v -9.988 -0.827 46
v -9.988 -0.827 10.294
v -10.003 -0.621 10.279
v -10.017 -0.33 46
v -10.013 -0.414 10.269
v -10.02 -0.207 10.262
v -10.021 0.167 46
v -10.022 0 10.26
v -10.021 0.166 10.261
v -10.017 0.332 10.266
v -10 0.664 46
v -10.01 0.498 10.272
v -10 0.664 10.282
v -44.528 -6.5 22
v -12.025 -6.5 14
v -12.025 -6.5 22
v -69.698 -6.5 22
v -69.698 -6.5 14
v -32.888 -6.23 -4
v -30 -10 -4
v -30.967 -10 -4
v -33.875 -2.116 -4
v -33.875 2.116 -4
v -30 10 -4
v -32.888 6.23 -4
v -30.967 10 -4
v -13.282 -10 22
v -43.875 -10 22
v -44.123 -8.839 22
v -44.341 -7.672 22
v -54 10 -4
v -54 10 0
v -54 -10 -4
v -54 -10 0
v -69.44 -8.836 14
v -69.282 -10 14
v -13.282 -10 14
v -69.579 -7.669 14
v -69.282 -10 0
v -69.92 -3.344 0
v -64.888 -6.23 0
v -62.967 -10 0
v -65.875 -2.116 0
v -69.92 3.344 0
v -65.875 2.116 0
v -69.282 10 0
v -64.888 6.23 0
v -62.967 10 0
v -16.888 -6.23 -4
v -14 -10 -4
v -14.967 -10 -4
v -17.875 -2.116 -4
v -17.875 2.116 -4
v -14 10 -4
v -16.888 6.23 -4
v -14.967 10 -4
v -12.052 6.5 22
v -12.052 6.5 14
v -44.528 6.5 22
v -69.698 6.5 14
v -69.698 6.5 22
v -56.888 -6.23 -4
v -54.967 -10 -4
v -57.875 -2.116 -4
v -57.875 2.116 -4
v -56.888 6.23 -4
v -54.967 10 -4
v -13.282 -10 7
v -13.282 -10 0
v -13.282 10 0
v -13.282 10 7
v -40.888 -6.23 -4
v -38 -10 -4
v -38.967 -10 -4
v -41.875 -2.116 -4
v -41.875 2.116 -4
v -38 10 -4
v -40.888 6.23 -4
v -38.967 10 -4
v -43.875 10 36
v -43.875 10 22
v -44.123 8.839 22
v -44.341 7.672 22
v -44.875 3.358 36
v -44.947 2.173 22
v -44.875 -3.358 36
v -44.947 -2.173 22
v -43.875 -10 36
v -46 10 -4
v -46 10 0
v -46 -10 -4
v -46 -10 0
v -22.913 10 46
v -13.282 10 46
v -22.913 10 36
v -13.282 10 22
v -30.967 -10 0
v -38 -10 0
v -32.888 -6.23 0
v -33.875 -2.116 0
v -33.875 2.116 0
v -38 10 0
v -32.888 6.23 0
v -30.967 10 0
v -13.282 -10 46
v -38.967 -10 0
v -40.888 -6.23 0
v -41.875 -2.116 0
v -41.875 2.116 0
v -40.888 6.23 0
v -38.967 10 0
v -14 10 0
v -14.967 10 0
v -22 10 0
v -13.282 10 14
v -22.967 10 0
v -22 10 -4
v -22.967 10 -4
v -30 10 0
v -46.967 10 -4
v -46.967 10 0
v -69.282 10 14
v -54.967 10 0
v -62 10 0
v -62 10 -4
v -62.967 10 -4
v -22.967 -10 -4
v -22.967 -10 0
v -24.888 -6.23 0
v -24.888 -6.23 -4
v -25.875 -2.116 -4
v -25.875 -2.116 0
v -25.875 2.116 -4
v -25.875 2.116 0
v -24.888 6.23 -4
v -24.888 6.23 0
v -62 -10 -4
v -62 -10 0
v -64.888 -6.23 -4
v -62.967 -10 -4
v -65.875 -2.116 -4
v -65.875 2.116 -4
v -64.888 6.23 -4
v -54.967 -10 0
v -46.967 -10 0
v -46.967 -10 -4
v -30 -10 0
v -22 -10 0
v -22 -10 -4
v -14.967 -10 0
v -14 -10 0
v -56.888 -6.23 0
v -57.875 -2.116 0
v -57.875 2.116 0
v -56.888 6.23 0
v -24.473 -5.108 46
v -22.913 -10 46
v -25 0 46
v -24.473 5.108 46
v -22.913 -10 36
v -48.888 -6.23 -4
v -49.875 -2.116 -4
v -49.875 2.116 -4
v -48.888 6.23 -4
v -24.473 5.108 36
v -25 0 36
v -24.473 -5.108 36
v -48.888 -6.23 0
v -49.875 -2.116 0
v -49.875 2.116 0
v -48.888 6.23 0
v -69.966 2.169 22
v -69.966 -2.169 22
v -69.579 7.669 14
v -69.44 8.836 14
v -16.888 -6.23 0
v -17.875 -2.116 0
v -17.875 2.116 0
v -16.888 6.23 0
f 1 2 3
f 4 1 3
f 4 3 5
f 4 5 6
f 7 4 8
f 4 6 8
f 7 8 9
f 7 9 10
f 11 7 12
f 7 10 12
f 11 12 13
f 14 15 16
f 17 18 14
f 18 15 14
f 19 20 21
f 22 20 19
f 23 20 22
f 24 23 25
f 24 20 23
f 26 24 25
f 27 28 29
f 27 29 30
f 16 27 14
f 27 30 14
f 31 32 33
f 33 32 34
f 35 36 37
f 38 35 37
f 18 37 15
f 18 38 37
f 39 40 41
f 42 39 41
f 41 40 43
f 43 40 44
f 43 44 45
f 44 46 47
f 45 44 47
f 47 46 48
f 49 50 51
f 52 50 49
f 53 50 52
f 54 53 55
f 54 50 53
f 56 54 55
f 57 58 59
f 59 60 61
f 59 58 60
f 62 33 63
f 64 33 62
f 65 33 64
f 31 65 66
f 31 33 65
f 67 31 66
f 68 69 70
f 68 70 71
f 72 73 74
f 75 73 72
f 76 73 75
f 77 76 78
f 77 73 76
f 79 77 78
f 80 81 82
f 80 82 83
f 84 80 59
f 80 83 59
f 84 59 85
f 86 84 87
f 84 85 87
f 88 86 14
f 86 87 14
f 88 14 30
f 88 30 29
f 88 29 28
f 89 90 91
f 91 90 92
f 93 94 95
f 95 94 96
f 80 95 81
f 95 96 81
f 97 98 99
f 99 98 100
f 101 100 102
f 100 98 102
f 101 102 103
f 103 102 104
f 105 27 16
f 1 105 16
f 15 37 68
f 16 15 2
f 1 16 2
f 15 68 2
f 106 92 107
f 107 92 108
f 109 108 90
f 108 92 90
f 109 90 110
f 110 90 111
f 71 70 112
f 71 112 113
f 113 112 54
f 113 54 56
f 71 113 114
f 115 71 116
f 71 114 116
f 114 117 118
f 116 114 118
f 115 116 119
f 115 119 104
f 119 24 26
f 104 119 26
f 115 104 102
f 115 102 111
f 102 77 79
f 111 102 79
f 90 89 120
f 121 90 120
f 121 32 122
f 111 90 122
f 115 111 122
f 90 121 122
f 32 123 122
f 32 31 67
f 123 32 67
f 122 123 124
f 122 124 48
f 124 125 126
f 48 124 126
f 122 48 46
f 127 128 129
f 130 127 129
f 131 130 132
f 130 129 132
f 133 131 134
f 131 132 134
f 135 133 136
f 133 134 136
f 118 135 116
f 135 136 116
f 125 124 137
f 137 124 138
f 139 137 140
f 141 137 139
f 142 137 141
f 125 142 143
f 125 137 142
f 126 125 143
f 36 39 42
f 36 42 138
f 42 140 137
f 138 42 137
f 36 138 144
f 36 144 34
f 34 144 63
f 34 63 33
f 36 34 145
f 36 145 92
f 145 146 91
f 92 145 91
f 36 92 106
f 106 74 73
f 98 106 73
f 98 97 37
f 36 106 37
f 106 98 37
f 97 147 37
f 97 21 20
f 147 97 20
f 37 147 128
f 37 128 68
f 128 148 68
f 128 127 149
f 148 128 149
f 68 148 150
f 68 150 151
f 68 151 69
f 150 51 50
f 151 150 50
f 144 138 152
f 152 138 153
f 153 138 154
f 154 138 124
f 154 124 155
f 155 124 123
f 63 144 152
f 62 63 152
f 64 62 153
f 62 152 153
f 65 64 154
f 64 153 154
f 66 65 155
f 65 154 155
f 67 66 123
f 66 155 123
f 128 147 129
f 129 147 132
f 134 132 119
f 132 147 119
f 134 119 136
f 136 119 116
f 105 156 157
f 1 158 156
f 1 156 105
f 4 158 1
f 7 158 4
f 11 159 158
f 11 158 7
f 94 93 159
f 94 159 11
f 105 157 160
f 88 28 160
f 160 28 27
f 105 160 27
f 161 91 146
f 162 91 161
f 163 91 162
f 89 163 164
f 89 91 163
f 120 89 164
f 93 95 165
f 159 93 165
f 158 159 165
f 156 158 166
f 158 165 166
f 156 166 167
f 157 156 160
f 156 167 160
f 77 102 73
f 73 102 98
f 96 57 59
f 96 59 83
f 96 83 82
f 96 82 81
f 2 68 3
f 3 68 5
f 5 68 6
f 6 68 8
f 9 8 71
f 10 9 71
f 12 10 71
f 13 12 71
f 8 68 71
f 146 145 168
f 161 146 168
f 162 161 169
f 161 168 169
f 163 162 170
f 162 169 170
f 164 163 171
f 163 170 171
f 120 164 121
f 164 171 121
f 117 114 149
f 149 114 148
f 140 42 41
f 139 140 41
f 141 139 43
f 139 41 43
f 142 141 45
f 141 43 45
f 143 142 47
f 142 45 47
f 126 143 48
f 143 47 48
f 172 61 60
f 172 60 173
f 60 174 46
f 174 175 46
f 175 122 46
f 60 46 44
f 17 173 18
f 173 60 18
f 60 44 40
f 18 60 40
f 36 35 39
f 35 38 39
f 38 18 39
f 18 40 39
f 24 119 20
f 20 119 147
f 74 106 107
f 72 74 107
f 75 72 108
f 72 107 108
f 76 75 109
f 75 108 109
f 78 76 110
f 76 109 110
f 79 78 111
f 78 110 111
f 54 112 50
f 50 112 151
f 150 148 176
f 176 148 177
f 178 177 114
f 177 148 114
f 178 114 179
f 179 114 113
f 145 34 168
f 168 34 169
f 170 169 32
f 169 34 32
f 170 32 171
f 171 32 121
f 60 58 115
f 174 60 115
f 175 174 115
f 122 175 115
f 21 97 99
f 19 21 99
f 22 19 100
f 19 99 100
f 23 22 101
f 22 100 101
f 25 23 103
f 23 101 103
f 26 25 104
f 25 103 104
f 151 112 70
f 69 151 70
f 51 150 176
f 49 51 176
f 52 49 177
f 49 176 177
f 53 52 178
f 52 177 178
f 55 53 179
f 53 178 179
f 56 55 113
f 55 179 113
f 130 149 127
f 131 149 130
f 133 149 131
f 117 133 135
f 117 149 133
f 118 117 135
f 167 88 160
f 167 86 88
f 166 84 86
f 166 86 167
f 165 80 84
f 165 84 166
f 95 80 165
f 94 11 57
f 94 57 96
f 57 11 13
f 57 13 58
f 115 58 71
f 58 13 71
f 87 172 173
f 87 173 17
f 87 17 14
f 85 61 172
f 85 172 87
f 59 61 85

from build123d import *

# Parameters (mm, degrees)
BOSS_EXTRUDE1_DEPTH     = 22
BOSS_EXTRUDE2_DEPTH     = 36
BOSS_EXTRUDE3_DEPTH     = 46
SKETCH4_W               = 8
SKETCH4_H               = 3.5
CUT_EXTRUDE1_DEPTH      = 61.012155958
CUT_EXTRUDE3_DEPTH      = 11
CUT_EXTRUDE3_DEPTH_BACK = 11
BOSS_EXTRUDE4_DEPTH     = 4
LPATTERN1_COUNT         = 7
LPATTERN1_PITCH         = 8


with BuildPart() as part:
    # Sketch1 → Boss-Extrude1 (new body)
    with BuildSketch(Plane.XY):
        with BuildLine():
            Line((-69.282032303, -10), (-43.874821937, -10))
            ThreePointArc((-43.874821937, -10), (-45, 0), (-43.874821937, 10))
            Line((-43.874821937, 10), (-69.282032303, 10))
            ThreePointArc((-69.282032303, 10), (-70, 0), (-69.282032303, -10))
        make_face()
    extrude(amount=BOSS_EXTRUDE1_DEPTH)

    # Sketch1<3> → Boss-Extrude2 (add)
    with BuildSketch(Plane.XY):
        with BuildLine():
            Line((-43.874821937, -10), (-22.912878475, -10))
            ThreePointArc((-22.912878475, -10), (-25, 0), (-22.912878475, 10))
            Line((-22.912878475, 10), (-43.874821937, 10))
            ThreePointArc((-43.874821937, 10), (-45, 0), (-43.874821937, -10))
        make_face()
    extrude(amount=BOSS_EXTRUDE2_DEPTH)

    # Sketch1<4> → Boss-Extrude3 (add)
    with BuildSketch(Plane.XY):
        with BuildLine():
            Line((-22.912878475, -10), (-13.282032303, -10))
            Line((-13.282032303, -10), (-9.987844042, -0.827246844))
            ThreePointArc((-9.987844042, -0.827246844), (-10.021711204, -0.081673003), (-10, 0.664353779))
            Line((-10, 0.664353779), (-13.282032303, 10))
            Line((-13.282032303, 10), (-22.912878475, 10))
            ThreePointArc((-22.912878475, 10), (-25, 0), (-22.912878475, -10))
        make_face()
    extrude(amount=BOSS_EXTRUDE3_DEPTH)

    # Sketch4 → Cut-Extrude1 (cut, through all)
    with BuildSketch(Plane.ZY.offset(70)):
        with Locations((18, 8.25)):
            Rectangle(SKETCH4_W, SKETCH4_H)
        with Locations((18, -8.25)):
            Rectangle(SKETCH4_W, SKETCH4_H)
    extrude(amount=-CUT_EXTRUDE1_DEPTH, mode=Mode.SUBTRACT)

    # Sketch8 → Cut-Extrude3 (cut, two sides)
    with BuildSketch(Plane(origin=(0, 0, 0), x_dir=(1, 0, 0), z_dir=(0, 1, 0))) as cut_extrude3_sk:
        Polygon((-13.282032303, -7), (-9.987844042, -10.294188261), (-9.987844042, 0), (-13.282032303, 0), align=None)
    extrude(amount=CUT_EXTRUDE3_DEPTH, mode=Mode.SUBTRACT)
    extrude(cut_extrude3_sk.sketch, amount=-CUT_EXTRUDE3_DEPTH_BACK, mode=Mode.SUBTRACT)

    # Sketch7 → Boss-Extrude4 (add)
    with BuildSketch(Plane(origin=(0, 0, 0), x_dir=(-1, 0, 0), z_dir=(0, 0, -1))):
        with BuildLine():
            Line((14, 10), (14, -10))
            Line((14, -10), (14.966629547, -10))
            ThreePointArc((14.966629547, -10), (18, 0), (14.966629547, 10))
            Line((14.966629547, 10), (14, 10))
        make_face()
    boss_extrude4 = extrude(amount=BOSS_EXTRUDE4_DEPTH)

    # LPattern1: Boss-Extrude4 ×7
    with Locations(*[(-i * LPATTERN1_PITCH, 0, 0) for i in range(1, LPATTERN1_COUNT)]):
        add(boss_extrude4)


solid = part.part
